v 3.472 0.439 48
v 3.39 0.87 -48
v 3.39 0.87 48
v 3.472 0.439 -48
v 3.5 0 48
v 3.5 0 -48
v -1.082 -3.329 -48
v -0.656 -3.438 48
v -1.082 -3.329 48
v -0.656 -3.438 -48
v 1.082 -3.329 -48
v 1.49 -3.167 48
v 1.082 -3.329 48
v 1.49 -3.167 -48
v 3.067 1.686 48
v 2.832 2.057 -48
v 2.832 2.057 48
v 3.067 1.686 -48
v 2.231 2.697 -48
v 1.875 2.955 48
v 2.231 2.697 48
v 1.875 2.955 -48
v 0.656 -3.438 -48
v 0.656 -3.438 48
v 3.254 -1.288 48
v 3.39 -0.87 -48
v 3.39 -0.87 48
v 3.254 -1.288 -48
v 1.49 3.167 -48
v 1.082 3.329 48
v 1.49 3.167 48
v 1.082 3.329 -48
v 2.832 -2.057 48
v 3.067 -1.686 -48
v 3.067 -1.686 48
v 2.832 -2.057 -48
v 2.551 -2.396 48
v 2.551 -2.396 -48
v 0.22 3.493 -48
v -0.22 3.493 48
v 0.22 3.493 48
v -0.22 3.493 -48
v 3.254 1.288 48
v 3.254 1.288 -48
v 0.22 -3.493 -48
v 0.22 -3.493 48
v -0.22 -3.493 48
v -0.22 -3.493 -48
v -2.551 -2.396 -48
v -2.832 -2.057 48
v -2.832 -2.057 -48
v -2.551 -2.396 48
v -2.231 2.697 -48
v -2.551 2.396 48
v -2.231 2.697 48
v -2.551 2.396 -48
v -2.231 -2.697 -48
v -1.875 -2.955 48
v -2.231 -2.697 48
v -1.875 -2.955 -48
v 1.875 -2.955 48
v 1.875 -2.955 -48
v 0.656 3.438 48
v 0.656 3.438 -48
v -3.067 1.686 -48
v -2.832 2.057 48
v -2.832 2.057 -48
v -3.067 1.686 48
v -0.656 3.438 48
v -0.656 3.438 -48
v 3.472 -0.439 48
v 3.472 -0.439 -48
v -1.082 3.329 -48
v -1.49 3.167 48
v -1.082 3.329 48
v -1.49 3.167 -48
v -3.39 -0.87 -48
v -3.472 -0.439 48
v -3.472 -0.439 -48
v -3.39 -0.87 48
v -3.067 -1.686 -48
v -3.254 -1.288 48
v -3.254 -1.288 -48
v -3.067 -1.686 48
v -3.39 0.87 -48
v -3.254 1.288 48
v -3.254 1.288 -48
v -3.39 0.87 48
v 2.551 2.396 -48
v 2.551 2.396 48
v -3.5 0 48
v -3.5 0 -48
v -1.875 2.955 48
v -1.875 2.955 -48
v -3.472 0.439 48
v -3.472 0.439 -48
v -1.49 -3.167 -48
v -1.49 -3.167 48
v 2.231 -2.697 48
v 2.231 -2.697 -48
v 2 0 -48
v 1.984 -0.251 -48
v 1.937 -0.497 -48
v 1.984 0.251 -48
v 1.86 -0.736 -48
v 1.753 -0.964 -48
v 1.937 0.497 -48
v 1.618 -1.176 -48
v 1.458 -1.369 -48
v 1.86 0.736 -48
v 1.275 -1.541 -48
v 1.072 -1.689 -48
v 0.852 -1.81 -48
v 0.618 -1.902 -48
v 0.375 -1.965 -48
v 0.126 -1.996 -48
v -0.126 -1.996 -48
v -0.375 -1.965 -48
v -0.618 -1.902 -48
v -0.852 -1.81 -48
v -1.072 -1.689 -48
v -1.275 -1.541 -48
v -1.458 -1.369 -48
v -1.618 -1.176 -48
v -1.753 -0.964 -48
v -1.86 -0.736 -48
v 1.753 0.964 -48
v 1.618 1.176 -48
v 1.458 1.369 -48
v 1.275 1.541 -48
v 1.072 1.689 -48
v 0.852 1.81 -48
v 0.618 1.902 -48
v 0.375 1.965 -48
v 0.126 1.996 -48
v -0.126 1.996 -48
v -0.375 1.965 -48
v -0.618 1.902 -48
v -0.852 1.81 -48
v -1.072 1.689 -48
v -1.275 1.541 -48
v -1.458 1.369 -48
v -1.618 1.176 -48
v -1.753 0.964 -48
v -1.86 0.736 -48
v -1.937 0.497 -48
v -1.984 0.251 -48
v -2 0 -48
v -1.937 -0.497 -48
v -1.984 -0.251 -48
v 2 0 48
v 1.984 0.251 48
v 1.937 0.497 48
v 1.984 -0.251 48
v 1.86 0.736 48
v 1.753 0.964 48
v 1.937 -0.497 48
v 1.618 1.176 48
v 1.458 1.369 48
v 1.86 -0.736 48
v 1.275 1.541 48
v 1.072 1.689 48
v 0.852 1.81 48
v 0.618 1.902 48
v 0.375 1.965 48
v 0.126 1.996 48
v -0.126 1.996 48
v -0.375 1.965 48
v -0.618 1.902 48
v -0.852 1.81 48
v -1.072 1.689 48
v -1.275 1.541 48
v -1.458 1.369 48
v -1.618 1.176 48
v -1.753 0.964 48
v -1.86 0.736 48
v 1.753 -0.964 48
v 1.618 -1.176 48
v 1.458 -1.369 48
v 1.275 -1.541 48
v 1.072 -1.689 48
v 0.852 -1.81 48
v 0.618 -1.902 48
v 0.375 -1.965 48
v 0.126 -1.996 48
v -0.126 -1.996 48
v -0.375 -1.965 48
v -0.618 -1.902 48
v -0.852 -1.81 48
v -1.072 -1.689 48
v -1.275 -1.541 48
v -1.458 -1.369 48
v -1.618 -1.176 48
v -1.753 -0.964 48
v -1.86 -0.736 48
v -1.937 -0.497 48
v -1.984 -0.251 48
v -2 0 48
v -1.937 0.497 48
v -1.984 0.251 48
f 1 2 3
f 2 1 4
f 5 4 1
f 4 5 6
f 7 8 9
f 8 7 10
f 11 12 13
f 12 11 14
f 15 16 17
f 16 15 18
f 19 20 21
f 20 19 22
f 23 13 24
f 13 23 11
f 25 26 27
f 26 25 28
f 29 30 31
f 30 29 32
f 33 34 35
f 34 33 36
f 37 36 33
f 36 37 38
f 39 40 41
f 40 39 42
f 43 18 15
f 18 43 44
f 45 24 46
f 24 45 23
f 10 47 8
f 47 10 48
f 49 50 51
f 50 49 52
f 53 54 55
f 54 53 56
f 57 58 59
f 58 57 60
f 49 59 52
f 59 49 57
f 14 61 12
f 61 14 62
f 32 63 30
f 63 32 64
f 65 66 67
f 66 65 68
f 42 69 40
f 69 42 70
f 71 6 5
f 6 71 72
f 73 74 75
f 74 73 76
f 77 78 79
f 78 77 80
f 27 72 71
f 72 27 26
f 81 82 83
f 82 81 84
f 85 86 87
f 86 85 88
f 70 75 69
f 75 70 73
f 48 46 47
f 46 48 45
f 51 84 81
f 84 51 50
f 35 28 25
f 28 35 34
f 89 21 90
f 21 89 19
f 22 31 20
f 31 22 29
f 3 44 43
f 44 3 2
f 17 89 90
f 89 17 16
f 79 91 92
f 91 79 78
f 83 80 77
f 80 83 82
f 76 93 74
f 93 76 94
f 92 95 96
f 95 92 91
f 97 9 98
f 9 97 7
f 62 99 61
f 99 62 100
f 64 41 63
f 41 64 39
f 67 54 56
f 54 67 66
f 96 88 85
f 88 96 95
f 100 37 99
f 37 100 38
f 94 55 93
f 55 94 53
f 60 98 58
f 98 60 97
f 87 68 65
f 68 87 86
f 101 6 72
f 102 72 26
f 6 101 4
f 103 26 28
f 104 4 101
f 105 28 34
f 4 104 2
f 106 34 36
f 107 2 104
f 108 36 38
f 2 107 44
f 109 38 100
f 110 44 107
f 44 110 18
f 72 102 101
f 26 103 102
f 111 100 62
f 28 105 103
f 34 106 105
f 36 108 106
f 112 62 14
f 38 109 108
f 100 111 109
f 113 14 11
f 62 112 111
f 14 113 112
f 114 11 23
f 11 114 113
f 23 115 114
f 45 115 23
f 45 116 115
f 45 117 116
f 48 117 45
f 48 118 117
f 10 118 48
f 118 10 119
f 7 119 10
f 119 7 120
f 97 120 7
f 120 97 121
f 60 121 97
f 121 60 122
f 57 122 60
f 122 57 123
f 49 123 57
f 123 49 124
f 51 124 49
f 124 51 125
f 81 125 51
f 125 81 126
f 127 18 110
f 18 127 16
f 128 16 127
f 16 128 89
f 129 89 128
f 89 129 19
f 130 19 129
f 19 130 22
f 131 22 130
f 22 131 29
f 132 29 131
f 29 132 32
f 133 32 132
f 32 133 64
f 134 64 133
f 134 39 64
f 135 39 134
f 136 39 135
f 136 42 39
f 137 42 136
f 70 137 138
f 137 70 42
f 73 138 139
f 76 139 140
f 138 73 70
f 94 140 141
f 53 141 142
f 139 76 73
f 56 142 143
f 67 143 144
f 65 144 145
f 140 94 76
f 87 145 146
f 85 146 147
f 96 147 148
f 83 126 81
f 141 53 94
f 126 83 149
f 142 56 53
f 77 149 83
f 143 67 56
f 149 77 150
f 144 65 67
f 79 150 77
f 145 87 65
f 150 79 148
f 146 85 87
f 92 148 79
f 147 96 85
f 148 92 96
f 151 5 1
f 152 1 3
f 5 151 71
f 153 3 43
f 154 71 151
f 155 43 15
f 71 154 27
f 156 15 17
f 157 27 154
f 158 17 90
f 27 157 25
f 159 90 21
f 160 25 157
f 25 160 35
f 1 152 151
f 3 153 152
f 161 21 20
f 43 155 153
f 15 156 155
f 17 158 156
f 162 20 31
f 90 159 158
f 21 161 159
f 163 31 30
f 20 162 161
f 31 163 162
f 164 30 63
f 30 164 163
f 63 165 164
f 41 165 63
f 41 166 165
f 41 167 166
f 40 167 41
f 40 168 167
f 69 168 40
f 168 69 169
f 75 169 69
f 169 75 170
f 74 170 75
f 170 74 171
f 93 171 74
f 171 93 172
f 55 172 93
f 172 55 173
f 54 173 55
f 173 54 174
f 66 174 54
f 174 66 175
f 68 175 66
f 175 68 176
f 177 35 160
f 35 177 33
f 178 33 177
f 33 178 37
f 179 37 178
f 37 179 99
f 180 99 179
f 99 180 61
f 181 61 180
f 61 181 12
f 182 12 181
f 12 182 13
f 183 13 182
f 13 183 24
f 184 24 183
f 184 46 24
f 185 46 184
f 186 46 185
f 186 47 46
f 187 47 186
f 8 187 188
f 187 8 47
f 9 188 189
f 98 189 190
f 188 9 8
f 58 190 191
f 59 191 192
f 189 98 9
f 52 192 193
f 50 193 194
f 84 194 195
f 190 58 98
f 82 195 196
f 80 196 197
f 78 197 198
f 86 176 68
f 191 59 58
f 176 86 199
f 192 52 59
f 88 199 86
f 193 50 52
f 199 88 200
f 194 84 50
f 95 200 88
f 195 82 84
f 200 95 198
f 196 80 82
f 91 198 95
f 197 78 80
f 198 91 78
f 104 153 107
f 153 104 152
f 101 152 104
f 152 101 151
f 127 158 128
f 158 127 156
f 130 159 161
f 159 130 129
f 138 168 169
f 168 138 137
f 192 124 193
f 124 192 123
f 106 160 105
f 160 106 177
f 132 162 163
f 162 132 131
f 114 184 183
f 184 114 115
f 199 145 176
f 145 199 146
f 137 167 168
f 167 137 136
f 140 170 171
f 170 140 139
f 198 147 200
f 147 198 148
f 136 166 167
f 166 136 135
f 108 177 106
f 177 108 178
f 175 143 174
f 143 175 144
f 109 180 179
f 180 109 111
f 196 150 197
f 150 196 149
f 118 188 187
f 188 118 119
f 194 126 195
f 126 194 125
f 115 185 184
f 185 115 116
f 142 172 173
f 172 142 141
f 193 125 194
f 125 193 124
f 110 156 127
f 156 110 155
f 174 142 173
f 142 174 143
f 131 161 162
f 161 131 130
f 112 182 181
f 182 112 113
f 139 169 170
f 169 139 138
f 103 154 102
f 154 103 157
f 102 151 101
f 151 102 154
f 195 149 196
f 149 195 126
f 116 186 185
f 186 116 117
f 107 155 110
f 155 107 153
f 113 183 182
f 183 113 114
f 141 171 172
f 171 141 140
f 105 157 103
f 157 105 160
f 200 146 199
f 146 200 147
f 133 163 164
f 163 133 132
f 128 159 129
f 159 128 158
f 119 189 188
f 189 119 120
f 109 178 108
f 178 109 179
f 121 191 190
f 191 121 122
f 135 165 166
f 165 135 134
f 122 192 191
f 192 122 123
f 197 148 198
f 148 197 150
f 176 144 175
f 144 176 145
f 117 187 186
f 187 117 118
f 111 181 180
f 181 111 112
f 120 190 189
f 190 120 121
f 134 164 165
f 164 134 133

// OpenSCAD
$fn = 50;


difference() {
	union() {
		translate(v = [0, 0, -48.0000000000]) {
			cylinder(h = 96, r = 3.5000000000);
		}
	}
	union() {
		translate(v = [0, 0, -100.0000000000]) {
			cylinder(h = 200, r = 2.0000000000);
		}
	}
}
